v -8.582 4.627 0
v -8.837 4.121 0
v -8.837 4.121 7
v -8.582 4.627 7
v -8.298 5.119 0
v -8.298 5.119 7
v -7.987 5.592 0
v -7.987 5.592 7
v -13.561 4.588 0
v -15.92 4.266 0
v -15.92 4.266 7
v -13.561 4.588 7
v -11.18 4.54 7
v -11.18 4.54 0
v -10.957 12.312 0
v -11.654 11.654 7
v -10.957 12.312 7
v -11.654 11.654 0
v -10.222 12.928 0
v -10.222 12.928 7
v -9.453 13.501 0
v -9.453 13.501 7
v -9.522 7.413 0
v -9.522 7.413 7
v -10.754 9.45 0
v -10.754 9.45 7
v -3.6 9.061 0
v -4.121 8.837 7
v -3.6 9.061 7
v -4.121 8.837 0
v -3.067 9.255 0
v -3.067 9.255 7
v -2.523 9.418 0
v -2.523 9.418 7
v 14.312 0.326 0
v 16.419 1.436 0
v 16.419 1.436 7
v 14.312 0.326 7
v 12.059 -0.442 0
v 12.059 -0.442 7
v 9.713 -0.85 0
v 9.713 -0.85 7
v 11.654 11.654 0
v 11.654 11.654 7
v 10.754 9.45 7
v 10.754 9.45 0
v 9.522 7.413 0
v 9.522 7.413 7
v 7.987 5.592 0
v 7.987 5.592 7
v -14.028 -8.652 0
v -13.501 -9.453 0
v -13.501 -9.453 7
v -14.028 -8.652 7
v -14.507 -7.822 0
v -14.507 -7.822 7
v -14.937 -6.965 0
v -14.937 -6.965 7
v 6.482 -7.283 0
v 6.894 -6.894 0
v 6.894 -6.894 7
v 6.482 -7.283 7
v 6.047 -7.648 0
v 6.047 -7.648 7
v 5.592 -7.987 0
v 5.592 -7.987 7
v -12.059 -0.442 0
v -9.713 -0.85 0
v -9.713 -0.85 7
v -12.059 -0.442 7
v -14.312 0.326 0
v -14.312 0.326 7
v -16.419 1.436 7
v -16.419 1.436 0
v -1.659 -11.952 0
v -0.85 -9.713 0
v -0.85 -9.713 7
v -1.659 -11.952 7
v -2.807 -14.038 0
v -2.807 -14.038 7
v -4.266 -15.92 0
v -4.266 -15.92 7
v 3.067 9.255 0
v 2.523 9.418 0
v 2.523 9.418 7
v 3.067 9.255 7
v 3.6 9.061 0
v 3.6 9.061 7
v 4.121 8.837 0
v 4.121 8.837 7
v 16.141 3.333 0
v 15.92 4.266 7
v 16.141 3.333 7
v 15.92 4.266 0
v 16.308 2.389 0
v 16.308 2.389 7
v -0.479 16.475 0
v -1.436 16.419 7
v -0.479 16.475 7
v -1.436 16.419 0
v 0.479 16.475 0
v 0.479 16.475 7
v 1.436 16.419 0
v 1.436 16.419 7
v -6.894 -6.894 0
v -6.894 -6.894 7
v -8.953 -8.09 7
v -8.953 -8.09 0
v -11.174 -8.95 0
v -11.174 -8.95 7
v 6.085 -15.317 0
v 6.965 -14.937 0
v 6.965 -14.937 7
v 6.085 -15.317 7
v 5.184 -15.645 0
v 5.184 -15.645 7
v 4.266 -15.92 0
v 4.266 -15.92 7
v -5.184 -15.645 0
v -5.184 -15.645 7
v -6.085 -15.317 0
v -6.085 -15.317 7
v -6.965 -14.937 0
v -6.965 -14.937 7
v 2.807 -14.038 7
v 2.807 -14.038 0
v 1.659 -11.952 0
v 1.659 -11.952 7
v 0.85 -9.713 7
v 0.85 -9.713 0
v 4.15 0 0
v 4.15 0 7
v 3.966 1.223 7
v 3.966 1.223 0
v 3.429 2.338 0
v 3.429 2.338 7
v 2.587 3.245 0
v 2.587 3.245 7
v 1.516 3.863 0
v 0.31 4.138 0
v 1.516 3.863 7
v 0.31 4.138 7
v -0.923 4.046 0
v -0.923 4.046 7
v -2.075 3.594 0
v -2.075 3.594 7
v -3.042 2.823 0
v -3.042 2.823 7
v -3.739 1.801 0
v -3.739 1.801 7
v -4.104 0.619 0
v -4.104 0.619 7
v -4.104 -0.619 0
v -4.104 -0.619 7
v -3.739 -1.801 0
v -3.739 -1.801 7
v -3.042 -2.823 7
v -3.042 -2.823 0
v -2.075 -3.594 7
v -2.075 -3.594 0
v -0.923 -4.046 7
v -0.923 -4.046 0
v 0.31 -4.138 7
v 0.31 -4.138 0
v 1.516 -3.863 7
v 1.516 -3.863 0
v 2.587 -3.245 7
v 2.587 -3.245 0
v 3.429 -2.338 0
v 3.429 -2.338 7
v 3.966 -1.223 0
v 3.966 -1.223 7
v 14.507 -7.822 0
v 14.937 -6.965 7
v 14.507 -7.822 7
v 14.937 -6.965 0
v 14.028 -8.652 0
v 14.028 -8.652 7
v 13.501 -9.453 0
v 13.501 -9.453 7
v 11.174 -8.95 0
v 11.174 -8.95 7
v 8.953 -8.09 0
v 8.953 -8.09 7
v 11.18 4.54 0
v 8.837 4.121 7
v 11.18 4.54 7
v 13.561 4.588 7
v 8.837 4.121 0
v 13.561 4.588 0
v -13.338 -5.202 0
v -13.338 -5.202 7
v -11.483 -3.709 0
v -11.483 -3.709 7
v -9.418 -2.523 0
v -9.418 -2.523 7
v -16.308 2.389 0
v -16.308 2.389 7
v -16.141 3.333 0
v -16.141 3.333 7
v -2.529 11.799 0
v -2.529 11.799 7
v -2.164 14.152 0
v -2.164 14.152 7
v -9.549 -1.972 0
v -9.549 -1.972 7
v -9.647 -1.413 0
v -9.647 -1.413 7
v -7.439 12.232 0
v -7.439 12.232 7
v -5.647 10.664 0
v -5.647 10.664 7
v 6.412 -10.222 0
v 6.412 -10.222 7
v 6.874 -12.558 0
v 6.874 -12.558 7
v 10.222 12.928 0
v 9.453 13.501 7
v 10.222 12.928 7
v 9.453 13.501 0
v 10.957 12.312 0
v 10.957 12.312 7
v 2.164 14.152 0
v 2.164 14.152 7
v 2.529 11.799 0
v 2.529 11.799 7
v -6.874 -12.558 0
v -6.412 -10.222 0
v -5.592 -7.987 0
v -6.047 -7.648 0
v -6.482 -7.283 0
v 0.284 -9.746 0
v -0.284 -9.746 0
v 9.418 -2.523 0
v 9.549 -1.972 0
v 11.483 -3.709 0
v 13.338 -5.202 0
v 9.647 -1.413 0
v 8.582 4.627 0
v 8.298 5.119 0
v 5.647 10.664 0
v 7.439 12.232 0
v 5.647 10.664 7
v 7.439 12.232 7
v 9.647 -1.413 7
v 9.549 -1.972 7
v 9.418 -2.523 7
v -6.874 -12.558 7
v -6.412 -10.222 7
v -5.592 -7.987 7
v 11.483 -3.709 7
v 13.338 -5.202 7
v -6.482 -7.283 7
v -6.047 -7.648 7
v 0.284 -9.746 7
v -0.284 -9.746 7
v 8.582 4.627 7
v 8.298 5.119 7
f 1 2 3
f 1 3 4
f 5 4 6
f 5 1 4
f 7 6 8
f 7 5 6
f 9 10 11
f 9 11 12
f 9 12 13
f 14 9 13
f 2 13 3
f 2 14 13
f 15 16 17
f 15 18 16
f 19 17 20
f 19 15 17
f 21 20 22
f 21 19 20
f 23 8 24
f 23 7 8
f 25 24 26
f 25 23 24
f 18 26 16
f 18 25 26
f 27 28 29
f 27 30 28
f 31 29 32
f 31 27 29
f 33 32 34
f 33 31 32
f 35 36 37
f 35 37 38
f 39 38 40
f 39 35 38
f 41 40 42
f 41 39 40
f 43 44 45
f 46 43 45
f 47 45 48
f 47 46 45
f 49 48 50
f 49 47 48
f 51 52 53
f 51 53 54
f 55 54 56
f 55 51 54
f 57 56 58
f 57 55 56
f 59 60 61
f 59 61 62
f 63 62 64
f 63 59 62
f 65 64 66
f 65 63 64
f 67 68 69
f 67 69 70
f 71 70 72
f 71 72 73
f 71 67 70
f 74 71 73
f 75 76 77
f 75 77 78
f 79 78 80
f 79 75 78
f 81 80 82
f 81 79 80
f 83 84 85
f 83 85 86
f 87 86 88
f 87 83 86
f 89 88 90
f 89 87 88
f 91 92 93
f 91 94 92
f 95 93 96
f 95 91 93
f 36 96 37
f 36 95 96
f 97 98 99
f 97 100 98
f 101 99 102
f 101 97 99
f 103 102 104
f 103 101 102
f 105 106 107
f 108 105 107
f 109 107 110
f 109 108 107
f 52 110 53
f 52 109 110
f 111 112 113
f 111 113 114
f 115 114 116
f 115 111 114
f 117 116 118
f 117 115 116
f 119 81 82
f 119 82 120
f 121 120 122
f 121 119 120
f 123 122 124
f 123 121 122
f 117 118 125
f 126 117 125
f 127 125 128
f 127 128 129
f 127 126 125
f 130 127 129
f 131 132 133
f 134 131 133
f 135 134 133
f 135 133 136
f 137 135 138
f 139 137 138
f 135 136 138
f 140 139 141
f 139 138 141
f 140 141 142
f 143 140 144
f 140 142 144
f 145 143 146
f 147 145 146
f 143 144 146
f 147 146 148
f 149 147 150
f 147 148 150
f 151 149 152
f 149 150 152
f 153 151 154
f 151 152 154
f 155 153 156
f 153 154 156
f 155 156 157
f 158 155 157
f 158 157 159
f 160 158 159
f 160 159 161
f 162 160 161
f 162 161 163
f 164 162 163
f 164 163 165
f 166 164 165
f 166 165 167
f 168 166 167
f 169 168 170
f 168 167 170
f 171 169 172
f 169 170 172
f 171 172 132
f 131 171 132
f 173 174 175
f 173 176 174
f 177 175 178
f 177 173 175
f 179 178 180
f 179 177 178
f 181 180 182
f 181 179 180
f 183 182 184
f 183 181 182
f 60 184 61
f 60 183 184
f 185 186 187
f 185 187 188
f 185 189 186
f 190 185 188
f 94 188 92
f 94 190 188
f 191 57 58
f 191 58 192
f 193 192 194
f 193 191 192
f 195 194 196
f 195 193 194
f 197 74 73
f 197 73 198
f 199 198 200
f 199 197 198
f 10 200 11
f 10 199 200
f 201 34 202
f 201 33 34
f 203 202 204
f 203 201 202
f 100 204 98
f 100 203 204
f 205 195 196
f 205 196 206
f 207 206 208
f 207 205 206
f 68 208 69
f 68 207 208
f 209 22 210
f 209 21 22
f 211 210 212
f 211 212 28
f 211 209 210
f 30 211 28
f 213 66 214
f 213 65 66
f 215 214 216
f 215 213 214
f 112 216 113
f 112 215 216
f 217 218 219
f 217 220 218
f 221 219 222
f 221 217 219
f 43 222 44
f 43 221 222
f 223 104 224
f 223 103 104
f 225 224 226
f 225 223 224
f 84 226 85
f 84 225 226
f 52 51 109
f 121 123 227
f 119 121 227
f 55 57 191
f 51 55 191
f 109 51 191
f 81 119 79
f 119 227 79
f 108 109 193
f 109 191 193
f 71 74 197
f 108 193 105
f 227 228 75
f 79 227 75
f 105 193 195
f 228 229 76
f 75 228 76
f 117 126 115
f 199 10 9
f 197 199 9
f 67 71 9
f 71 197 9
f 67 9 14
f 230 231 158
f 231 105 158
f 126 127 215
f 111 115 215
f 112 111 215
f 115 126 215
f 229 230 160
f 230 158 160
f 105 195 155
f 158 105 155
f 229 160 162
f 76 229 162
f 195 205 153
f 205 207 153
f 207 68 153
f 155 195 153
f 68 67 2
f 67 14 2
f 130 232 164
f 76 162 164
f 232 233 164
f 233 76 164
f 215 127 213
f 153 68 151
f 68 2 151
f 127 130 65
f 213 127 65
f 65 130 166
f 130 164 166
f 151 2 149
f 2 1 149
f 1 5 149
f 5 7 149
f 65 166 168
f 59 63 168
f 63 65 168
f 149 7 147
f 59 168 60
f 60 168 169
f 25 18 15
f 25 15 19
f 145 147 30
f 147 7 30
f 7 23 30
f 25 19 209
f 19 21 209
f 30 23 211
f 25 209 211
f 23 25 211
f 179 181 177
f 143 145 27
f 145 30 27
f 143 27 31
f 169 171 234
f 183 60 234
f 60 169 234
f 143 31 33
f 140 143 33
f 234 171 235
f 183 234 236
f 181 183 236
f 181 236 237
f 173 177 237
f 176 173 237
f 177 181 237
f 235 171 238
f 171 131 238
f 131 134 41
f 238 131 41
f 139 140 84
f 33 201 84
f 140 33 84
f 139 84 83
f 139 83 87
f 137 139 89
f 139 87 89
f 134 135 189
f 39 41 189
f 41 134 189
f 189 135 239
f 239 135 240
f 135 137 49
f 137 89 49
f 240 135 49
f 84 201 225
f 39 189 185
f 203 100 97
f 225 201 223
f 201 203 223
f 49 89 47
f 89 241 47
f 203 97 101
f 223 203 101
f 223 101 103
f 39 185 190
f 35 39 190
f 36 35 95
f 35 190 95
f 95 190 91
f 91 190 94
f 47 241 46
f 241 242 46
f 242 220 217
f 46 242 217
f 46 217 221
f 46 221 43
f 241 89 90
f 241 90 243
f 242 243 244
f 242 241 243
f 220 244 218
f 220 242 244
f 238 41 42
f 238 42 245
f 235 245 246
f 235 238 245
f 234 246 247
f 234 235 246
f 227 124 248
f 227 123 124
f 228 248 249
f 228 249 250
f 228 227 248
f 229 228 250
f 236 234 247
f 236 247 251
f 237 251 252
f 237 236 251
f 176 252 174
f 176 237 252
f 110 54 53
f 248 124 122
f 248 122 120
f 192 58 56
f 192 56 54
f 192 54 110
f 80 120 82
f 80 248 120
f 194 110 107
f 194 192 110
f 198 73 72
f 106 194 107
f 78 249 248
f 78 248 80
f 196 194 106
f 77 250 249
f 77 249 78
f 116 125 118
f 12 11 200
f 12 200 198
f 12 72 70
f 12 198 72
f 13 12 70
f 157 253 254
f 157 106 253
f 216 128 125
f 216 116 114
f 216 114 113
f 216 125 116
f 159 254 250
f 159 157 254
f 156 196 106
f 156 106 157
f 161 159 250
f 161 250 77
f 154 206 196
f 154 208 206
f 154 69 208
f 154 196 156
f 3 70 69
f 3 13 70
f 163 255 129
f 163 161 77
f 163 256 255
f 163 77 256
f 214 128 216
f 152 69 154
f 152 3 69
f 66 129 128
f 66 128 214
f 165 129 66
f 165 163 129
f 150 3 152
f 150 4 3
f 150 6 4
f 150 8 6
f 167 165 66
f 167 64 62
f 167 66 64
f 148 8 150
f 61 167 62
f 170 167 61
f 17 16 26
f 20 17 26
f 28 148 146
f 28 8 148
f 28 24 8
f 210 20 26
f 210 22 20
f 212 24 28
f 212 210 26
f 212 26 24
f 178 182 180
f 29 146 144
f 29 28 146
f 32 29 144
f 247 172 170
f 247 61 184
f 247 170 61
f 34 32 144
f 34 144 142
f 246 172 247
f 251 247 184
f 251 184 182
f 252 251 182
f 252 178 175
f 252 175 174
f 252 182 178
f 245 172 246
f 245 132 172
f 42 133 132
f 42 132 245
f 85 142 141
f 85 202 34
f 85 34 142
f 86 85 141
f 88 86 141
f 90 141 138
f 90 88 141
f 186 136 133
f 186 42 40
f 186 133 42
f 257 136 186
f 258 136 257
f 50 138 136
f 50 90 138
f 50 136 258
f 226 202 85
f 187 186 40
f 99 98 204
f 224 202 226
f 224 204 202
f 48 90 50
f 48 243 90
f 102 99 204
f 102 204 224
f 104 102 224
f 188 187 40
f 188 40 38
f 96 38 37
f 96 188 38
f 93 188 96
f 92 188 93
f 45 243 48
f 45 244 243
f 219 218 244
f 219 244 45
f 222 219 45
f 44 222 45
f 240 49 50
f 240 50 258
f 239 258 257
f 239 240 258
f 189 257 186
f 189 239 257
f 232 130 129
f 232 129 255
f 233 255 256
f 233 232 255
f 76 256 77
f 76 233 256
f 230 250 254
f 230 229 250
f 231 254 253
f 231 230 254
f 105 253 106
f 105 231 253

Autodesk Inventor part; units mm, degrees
sketch "Sketch1" plane through (0, 0, 0) normal (0, 0, 1) x (1, 0, 0)
  circle A0 centre (0, 0) radius 16.4816
  dimension "d0" = 32.9631
extrude "Extrusion1" add sketch "Sketch1" along normal blind 7
ref_plane "Work Plane2" through (0, 0, 3.5) normal (0, 0, 1) x (1, 0, 0)
sketch "Sketch2" plane through (0, 0, 0) normal (0, 0, -1) x (-1, 0, 0)
  circle A0 centre (0, 0) radius 16.4816 projected
  circle A1 centre (0, 0) radius 13.5
  dimension "d3" = 27
surface extrude "Pitch Diameter" sketch "Sketch2" against normal through all shown no curves A1
ref_plane "Work Plane8" through (0, 0, 0) normal (0.9396926, 0.3420201, 0) x (0, 0, 1)
ref_plane "Work Plane9" through (0, 0, 0) normal (1, 0, 0) x (0, 1, 0)
spur gear teeth "Spur Gear" teeth 9 pitch diameter 27 tip diameter 32.9632 root diameter 19.5 face width 7 start plane through (0, 0, 0) normal (0, 0, -1) x (-1, 0, 0)
sketch "Sketch3" plane through (0, 0, 7) normal (0, 0, 1) x (1, 0, 0)
  point P0 (0, 0)
sketch "Sketch4" plane through (0, 0, 7) normal (0, 0, 1) x (1, 0, 0)
  circle A0 centre (0, 0) radius 4.15
  dimension "d49" = 8.3
extrude "Extrusion2" cut sketch "Sketch4" against normal blind 10
equation "\"d0\" = da_da"
equation "\"d1\" = da_b"
equation "\"d3\" = da_d"
equation "\"da_da\" = 32.963154"
equation "\"da_b\" = 7"
equation "\"da_d\" = 27"
properties part number "Spur Gear1" material "Steel"
